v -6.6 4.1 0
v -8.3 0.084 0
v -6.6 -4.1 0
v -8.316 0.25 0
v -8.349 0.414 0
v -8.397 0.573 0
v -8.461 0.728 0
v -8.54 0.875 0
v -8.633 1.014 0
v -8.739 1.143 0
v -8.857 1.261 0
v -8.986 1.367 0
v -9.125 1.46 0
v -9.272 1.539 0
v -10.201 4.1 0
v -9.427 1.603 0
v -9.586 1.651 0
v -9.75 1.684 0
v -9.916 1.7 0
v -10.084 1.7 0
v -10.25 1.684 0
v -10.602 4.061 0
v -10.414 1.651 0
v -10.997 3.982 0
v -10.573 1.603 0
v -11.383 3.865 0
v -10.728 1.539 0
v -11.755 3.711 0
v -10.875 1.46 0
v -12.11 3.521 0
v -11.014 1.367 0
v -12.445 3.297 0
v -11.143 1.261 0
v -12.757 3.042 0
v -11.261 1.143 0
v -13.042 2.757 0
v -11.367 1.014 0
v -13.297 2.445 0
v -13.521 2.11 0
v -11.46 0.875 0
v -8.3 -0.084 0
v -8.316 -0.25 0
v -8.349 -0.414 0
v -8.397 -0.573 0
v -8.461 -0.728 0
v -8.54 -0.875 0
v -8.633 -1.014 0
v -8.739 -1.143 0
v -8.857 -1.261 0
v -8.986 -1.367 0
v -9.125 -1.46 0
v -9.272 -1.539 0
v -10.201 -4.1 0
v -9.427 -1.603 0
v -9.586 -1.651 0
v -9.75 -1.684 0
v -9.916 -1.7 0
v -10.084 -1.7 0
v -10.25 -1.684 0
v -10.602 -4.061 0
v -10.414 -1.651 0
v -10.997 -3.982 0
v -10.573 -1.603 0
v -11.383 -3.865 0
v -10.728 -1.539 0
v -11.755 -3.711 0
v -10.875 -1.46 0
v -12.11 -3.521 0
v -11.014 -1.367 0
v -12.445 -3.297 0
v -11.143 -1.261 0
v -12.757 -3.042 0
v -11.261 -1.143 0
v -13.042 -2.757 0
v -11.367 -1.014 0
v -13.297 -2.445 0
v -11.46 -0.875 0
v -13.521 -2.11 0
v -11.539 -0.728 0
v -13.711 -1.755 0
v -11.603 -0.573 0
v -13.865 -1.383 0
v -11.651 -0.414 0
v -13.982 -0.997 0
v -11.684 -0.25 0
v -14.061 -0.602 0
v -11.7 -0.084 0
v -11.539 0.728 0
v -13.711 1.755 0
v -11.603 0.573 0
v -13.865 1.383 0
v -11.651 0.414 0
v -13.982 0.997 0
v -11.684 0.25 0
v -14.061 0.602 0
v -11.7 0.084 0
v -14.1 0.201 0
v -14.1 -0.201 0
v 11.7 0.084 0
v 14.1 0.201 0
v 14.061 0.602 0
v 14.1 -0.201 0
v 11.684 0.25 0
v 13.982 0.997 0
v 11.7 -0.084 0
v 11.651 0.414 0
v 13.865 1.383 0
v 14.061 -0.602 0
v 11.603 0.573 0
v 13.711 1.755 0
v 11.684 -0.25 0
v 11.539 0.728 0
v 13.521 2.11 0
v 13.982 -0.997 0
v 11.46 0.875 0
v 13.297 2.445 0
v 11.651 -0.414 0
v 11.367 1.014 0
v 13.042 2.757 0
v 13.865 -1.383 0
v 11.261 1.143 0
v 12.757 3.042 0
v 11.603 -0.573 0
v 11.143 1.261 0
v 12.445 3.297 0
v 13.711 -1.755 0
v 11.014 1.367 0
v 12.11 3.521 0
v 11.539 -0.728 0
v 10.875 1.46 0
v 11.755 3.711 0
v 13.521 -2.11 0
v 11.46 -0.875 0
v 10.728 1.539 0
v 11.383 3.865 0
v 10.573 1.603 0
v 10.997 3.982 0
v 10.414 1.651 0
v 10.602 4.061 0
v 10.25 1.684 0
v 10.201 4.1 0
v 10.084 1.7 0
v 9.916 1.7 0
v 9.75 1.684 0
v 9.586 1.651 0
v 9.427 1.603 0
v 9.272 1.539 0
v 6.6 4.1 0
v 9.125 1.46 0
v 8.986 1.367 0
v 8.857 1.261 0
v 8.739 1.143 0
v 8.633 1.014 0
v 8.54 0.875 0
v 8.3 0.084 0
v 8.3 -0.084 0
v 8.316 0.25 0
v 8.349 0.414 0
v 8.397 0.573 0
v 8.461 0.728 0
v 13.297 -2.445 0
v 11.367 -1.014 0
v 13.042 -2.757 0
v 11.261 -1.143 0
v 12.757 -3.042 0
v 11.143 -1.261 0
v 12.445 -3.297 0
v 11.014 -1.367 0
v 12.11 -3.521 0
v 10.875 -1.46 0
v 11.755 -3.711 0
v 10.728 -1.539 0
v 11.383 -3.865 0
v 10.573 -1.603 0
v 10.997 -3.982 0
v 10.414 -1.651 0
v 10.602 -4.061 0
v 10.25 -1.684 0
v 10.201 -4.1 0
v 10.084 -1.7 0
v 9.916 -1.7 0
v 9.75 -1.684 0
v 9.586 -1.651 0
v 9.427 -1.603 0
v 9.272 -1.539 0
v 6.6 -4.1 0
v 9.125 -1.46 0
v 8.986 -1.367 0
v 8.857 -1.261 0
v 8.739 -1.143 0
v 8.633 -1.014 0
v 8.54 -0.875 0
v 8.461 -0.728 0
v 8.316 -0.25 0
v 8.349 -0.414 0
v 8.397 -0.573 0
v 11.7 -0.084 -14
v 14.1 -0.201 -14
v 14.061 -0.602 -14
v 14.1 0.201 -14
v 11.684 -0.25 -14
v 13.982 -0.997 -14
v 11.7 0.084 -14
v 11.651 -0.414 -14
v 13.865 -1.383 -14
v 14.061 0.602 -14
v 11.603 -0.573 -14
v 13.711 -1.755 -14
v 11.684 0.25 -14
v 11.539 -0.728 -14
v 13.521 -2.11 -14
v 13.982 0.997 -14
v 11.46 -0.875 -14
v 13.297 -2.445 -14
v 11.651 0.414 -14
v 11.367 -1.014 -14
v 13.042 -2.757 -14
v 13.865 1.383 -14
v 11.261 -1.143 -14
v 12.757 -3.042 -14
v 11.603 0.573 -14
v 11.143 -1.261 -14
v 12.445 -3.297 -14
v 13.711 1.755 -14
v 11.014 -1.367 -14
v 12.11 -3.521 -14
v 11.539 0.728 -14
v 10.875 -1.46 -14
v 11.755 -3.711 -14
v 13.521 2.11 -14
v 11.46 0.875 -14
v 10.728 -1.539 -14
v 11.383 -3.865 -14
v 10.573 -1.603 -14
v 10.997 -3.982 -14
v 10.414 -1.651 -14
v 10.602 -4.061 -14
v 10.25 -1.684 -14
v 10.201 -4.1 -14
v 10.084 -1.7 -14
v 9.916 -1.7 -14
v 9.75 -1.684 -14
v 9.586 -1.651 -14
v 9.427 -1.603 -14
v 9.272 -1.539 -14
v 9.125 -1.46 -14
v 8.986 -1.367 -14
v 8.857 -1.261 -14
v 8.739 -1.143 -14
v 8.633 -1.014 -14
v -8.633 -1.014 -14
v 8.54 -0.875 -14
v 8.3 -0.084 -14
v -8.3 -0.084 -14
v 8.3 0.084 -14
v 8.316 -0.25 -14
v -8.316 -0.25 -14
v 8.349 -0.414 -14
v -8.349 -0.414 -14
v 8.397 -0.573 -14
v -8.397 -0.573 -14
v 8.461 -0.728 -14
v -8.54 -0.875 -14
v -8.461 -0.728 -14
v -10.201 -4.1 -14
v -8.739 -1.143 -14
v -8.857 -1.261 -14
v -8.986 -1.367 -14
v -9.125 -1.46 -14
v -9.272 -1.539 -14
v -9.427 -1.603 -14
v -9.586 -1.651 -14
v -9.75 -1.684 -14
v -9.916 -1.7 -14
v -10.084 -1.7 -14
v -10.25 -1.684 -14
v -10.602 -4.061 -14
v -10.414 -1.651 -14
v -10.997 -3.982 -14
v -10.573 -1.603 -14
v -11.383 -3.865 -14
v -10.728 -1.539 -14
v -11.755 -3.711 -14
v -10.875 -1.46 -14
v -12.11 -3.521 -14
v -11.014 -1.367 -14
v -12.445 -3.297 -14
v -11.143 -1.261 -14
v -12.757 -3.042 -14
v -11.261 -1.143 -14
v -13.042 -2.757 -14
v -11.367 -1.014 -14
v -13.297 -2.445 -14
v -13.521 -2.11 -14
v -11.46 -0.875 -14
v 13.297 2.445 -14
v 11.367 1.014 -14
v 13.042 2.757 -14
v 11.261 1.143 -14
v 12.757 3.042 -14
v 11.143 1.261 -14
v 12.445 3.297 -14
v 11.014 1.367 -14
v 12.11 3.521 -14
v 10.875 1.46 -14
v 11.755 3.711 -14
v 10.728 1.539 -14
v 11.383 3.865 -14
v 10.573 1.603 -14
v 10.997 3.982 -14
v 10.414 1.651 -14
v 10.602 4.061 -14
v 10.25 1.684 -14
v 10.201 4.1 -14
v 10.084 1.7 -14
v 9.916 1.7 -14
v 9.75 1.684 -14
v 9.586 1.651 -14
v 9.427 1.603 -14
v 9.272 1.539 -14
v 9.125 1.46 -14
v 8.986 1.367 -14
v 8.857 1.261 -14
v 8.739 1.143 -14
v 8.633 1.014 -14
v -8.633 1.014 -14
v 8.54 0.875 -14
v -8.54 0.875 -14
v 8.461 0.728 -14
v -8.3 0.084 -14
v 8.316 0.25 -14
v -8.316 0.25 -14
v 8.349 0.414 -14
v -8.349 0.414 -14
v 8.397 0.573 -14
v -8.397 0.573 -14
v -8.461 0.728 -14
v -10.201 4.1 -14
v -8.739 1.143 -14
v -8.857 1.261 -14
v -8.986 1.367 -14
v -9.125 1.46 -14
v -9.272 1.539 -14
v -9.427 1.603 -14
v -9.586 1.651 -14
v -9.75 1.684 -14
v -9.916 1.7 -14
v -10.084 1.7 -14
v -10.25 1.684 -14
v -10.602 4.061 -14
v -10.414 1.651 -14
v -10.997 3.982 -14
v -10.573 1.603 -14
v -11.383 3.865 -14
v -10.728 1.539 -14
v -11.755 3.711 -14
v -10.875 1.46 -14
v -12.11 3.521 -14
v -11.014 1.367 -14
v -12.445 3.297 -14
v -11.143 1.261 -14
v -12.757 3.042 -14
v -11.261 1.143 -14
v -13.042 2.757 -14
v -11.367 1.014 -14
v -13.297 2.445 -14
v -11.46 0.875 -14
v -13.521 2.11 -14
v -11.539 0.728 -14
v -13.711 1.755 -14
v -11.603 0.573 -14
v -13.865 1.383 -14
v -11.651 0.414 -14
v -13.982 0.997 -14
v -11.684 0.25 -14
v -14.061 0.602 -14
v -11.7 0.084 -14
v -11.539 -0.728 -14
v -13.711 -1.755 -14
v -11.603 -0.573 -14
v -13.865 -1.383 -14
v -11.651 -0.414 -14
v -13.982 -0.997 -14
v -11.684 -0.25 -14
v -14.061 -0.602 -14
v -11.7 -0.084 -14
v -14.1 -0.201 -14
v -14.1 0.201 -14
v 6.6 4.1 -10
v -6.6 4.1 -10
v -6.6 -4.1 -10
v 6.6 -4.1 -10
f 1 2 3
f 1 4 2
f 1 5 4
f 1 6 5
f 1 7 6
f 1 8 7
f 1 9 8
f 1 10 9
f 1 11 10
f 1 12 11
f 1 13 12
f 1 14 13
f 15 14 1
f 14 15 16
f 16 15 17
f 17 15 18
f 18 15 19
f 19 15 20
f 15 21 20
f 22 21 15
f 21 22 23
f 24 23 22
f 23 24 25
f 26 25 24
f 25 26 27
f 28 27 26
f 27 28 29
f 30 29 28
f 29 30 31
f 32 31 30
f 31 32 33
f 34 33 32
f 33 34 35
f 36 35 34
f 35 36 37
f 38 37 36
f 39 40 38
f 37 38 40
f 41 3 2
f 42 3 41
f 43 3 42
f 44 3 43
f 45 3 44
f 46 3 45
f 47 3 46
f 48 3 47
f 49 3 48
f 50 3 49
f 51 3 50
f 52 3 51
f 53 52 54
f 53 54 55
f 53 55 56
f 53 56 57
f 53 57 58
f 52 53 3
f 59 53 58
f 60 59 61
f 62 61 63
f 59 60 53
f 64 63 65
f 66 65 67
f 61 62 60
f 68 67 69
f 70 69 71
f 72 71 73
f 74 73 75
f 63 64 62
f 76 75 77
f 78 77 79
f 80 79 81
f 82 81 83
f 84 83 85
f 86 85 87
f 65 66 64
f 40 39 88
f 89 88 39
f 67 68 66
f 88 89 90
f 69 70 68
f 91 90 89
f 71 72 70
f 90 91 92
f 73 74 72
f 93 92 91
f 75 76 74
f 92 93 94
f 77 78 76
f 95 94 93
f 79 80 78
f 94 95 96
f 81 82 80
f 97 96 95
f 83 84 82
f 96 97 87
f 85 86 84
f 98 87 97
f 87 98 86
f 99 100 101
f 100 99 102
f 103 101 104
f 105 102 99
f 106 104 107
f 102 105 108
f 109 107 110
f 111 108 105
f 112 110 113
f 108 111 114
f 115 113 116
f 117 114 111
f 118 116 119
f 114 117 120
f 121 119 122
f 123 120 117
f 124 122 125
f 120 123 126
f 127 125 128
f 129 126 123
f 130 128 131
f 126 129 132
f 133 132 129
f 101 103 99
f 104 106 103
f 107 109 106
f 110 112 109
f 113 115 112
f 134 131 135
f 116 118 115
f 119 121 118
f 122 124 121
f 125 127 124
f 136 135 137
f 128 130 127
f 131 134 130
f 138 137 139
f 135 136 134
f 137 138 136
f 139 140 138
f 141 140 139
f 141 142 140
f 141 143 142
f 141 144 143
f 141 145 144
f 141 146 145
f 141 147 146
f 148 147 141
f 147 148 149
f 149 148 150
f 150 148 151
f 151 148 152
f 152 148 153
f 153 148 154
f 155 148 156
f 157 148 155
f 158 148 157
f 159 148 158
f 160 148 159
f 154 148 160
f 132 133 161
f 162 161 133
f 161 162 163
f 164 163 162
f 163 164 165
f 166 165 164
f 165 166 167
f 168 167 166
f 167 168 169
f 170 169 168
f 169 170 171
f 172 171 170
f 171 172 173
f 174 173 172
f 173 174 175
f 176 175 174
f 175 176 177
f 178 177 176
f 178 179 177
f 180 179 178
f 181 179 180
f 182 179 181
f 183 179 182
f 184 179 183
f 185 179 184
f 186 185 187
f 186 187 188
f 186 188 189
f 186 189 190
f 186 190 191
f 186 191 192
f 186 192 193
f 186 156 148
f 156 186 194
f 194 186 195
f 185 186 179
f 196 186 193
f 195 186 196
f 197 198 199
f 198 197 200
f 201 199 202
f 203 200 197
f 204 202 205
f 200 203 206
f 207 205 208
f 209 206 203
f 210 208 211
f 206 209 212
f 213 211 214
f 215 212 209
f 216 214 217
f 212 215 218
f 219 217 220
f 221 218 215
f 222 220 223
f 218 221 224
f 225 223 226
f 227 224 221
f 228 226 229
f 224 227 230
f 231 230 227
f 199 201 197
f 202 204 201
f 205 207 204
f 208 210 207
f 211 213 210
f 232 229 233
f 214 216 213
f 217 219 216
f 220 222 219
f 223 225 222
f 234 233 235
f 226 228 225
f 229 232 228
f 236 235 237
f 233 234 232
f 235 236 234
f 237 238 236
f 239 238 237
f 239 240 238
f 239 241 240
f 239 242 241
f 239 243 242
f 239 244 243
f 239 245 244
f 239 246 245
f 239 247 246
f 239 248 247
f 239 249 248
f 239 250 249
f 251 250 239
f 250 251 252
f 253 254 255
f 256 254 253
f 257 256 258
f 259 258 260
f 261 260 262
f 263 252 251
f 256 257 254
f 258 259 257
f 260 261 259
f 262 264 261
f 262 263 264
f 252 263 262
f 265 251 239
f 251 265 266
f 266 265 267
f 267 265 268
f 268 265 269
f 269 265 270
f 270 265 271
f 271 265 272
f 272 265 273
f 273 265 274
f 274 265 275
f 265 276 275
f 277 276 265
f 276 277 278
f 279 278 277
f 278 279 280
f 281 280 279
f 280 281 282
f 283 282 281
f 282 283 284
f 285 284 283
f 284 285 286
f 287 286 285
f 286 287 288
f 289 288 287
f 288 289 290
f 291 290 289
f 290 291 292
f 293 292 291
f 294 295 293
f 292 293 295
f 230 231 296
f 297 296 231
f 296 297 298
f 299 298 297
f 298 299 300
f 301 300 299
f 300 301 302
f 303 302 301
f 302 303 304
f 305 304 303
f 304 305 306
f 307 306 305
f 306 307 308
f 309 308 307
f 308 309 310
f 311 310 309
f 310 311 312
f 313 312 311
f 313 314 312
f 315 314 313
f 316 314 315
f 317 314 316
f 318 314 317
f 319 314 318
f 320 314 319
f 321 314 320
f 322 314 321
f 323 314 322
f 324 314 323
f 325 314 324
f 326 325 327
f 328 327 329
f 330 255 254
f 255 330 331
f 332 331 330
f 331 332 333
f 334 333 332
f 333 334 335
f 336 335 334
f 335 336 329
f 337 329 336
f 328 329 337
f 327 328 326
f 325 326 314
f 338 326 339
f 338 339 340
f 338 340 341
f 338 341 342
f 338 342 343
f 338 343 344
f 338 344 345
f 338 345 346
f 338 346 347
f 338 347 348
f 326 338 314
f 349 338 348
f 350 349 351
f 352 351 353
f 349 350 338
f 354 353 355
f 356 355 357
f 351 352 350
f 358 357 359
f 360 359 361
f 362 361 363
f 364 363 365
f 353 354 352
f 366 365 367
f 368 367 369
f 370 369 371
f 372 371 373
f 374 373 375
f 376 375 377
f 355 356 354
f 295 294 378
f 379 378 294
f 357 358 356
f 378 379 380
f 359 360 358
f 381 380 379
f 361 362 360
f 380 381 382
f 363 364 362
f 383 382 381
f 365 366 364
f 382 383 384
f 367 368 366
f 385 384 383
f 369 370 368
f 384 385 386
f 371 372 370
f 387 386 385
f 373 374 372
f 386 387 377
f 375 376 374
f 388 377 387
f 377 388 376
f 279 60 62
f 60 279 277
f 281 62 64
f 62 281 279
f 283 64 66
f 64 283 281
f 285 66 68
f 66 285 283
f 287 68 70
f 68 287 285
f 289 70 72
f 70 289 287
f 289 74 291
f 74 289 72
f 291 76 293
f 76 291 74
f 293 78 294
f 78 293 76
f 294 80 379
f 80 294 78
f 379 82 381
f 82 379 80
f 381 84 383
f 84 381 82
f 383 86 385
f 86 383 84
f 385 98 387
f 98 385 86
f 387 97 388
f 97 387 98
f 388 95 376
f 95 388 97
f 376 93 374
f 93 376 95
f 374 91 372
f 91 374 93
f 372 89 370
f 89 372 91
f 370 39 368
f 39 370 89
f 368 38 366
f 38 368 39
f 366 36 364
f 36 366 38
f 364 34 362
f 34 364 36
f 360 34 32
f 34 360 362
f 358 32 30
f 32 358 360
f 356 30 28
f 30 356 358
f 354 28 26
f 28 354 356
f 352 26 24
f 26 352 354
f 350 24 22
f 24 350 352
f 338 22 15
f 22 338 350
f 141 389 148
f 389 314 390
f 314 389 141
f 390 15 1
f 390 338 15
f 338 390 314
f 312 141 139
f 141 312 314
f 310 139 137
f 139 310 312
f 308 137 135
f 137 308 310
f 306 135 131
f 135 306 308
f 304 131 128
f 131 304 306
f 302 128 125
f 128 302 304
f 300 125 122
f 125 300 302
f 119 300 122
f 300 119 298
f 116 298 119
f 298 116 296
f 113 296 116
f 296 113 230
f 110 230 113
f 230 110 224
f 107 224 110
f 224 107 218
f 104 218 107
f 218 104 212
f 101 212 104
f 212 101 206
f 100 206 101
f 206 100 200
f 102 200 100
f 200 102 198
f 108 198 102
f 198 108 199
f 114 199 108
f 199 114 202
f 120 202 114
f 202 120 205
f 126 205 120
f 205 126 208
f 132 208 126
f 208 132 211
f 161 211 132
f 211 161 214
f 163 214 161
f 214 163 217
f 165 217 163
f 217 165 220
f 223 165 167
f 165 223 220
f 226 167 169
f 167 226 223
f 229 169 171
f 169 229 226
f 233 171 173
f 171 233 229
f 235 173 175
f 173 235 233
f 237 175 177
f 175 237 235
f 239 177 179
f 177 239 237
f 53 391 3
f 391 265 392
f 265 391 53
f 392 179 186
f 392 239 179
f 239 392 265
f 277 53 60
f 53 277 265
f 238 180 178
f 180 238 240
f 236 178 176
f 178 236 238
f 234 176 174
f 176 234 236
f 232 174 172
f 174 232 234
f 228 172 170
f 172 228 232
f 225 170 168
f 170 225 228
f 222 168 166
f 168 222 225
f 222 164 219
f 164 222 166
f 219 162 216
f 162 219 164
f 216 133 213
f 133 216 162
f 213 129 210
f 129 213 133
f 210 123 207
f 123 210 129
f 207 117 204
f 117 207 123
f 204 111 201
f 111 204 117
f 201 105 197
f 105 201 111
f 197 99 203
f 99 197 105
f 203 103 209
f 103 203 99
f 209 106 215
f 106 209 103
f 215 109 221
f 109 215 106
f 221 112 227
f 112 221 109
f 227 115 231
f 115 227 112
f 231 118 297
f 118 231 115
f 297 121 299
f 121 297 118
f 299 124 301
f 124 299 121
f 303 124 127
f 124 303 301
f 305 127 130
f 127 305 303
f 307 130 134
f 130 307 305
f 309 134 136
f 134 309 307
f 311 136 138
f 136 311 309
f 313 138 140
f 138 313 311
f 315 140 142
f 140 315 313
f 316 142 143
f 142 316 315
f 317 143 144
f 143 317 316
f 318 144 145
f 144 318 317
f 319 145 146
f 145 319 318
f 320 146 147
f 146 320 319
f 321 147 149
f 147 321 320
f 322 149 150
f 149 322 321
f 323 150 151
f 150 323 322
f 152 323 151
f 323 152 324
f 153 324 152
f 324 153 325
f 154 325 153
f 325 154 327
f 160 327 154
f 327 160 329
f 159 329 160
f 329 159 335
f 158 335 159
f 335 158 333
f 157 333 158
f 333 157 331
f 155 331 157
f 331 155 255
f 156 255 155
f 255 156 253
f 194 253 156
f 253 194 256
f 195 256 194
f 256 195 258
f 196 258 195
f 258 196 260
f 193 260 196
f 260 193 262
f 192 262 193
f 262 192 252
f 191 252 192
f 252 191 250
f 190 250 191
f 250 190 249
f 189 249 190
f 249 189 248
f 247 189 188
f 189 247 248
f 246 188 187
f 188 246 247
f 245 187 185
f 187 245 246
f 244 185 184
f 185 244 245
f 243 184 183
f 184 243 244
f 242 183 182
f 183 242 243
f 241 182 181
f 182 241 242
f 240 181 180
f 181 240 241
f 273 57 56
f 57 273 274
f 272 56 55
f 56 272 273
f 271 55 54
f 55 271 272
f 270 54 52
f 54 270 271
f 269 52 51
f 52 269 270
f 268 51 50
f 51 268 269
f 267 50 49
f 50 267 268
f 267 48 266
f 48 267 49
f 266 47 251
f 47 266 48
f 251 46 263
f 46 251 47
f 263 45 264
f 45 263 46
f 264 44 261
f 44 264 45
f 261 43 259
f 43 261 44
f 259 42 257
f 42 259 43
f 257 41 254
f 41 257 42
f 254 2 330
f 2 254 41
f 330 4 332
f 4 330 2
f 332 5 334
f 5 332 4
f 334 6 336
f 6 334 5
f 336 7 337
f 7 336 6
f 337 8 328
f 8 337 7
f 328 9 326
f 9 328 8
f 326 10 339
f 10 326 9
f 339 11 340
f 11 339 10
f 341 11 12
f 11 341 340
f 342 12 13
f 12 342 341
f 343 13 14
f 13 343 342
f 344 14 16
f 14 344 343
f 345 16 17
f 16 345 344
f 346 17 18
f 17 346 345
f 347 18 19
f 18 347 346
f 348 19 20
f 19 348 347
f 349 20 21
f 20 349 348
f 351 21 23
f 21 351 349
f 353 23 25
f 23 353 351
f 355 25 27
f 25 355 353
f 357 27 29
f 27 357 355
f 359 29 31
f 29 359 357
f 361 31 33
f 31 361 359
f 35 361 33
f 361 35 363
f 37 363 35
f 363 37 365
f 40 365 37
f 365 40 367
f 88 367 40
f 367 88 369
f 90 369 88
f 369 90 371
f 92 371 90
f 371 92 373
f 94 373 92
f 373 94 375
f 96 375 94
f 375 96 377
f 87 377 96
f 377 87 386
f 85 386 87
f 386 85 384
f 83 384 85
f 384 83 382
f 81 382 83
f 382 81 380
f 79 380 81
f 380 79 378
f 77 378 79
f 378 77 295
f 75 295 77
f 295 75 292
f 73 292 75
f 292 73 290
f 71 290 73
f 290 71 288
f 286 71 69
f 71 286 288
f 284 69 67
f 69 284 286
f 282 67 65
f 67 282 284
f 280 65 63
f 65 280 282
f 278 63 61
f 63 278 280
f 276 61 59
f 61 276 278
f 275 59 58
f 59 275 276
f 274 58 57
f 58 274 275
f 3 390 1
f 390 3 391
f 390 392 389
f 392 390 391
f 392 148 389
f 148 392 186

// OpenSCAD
use <../sketch-for-simpler.scad>;

rotate([0,180,0]) {
  y_dragchain_clamp();
}
